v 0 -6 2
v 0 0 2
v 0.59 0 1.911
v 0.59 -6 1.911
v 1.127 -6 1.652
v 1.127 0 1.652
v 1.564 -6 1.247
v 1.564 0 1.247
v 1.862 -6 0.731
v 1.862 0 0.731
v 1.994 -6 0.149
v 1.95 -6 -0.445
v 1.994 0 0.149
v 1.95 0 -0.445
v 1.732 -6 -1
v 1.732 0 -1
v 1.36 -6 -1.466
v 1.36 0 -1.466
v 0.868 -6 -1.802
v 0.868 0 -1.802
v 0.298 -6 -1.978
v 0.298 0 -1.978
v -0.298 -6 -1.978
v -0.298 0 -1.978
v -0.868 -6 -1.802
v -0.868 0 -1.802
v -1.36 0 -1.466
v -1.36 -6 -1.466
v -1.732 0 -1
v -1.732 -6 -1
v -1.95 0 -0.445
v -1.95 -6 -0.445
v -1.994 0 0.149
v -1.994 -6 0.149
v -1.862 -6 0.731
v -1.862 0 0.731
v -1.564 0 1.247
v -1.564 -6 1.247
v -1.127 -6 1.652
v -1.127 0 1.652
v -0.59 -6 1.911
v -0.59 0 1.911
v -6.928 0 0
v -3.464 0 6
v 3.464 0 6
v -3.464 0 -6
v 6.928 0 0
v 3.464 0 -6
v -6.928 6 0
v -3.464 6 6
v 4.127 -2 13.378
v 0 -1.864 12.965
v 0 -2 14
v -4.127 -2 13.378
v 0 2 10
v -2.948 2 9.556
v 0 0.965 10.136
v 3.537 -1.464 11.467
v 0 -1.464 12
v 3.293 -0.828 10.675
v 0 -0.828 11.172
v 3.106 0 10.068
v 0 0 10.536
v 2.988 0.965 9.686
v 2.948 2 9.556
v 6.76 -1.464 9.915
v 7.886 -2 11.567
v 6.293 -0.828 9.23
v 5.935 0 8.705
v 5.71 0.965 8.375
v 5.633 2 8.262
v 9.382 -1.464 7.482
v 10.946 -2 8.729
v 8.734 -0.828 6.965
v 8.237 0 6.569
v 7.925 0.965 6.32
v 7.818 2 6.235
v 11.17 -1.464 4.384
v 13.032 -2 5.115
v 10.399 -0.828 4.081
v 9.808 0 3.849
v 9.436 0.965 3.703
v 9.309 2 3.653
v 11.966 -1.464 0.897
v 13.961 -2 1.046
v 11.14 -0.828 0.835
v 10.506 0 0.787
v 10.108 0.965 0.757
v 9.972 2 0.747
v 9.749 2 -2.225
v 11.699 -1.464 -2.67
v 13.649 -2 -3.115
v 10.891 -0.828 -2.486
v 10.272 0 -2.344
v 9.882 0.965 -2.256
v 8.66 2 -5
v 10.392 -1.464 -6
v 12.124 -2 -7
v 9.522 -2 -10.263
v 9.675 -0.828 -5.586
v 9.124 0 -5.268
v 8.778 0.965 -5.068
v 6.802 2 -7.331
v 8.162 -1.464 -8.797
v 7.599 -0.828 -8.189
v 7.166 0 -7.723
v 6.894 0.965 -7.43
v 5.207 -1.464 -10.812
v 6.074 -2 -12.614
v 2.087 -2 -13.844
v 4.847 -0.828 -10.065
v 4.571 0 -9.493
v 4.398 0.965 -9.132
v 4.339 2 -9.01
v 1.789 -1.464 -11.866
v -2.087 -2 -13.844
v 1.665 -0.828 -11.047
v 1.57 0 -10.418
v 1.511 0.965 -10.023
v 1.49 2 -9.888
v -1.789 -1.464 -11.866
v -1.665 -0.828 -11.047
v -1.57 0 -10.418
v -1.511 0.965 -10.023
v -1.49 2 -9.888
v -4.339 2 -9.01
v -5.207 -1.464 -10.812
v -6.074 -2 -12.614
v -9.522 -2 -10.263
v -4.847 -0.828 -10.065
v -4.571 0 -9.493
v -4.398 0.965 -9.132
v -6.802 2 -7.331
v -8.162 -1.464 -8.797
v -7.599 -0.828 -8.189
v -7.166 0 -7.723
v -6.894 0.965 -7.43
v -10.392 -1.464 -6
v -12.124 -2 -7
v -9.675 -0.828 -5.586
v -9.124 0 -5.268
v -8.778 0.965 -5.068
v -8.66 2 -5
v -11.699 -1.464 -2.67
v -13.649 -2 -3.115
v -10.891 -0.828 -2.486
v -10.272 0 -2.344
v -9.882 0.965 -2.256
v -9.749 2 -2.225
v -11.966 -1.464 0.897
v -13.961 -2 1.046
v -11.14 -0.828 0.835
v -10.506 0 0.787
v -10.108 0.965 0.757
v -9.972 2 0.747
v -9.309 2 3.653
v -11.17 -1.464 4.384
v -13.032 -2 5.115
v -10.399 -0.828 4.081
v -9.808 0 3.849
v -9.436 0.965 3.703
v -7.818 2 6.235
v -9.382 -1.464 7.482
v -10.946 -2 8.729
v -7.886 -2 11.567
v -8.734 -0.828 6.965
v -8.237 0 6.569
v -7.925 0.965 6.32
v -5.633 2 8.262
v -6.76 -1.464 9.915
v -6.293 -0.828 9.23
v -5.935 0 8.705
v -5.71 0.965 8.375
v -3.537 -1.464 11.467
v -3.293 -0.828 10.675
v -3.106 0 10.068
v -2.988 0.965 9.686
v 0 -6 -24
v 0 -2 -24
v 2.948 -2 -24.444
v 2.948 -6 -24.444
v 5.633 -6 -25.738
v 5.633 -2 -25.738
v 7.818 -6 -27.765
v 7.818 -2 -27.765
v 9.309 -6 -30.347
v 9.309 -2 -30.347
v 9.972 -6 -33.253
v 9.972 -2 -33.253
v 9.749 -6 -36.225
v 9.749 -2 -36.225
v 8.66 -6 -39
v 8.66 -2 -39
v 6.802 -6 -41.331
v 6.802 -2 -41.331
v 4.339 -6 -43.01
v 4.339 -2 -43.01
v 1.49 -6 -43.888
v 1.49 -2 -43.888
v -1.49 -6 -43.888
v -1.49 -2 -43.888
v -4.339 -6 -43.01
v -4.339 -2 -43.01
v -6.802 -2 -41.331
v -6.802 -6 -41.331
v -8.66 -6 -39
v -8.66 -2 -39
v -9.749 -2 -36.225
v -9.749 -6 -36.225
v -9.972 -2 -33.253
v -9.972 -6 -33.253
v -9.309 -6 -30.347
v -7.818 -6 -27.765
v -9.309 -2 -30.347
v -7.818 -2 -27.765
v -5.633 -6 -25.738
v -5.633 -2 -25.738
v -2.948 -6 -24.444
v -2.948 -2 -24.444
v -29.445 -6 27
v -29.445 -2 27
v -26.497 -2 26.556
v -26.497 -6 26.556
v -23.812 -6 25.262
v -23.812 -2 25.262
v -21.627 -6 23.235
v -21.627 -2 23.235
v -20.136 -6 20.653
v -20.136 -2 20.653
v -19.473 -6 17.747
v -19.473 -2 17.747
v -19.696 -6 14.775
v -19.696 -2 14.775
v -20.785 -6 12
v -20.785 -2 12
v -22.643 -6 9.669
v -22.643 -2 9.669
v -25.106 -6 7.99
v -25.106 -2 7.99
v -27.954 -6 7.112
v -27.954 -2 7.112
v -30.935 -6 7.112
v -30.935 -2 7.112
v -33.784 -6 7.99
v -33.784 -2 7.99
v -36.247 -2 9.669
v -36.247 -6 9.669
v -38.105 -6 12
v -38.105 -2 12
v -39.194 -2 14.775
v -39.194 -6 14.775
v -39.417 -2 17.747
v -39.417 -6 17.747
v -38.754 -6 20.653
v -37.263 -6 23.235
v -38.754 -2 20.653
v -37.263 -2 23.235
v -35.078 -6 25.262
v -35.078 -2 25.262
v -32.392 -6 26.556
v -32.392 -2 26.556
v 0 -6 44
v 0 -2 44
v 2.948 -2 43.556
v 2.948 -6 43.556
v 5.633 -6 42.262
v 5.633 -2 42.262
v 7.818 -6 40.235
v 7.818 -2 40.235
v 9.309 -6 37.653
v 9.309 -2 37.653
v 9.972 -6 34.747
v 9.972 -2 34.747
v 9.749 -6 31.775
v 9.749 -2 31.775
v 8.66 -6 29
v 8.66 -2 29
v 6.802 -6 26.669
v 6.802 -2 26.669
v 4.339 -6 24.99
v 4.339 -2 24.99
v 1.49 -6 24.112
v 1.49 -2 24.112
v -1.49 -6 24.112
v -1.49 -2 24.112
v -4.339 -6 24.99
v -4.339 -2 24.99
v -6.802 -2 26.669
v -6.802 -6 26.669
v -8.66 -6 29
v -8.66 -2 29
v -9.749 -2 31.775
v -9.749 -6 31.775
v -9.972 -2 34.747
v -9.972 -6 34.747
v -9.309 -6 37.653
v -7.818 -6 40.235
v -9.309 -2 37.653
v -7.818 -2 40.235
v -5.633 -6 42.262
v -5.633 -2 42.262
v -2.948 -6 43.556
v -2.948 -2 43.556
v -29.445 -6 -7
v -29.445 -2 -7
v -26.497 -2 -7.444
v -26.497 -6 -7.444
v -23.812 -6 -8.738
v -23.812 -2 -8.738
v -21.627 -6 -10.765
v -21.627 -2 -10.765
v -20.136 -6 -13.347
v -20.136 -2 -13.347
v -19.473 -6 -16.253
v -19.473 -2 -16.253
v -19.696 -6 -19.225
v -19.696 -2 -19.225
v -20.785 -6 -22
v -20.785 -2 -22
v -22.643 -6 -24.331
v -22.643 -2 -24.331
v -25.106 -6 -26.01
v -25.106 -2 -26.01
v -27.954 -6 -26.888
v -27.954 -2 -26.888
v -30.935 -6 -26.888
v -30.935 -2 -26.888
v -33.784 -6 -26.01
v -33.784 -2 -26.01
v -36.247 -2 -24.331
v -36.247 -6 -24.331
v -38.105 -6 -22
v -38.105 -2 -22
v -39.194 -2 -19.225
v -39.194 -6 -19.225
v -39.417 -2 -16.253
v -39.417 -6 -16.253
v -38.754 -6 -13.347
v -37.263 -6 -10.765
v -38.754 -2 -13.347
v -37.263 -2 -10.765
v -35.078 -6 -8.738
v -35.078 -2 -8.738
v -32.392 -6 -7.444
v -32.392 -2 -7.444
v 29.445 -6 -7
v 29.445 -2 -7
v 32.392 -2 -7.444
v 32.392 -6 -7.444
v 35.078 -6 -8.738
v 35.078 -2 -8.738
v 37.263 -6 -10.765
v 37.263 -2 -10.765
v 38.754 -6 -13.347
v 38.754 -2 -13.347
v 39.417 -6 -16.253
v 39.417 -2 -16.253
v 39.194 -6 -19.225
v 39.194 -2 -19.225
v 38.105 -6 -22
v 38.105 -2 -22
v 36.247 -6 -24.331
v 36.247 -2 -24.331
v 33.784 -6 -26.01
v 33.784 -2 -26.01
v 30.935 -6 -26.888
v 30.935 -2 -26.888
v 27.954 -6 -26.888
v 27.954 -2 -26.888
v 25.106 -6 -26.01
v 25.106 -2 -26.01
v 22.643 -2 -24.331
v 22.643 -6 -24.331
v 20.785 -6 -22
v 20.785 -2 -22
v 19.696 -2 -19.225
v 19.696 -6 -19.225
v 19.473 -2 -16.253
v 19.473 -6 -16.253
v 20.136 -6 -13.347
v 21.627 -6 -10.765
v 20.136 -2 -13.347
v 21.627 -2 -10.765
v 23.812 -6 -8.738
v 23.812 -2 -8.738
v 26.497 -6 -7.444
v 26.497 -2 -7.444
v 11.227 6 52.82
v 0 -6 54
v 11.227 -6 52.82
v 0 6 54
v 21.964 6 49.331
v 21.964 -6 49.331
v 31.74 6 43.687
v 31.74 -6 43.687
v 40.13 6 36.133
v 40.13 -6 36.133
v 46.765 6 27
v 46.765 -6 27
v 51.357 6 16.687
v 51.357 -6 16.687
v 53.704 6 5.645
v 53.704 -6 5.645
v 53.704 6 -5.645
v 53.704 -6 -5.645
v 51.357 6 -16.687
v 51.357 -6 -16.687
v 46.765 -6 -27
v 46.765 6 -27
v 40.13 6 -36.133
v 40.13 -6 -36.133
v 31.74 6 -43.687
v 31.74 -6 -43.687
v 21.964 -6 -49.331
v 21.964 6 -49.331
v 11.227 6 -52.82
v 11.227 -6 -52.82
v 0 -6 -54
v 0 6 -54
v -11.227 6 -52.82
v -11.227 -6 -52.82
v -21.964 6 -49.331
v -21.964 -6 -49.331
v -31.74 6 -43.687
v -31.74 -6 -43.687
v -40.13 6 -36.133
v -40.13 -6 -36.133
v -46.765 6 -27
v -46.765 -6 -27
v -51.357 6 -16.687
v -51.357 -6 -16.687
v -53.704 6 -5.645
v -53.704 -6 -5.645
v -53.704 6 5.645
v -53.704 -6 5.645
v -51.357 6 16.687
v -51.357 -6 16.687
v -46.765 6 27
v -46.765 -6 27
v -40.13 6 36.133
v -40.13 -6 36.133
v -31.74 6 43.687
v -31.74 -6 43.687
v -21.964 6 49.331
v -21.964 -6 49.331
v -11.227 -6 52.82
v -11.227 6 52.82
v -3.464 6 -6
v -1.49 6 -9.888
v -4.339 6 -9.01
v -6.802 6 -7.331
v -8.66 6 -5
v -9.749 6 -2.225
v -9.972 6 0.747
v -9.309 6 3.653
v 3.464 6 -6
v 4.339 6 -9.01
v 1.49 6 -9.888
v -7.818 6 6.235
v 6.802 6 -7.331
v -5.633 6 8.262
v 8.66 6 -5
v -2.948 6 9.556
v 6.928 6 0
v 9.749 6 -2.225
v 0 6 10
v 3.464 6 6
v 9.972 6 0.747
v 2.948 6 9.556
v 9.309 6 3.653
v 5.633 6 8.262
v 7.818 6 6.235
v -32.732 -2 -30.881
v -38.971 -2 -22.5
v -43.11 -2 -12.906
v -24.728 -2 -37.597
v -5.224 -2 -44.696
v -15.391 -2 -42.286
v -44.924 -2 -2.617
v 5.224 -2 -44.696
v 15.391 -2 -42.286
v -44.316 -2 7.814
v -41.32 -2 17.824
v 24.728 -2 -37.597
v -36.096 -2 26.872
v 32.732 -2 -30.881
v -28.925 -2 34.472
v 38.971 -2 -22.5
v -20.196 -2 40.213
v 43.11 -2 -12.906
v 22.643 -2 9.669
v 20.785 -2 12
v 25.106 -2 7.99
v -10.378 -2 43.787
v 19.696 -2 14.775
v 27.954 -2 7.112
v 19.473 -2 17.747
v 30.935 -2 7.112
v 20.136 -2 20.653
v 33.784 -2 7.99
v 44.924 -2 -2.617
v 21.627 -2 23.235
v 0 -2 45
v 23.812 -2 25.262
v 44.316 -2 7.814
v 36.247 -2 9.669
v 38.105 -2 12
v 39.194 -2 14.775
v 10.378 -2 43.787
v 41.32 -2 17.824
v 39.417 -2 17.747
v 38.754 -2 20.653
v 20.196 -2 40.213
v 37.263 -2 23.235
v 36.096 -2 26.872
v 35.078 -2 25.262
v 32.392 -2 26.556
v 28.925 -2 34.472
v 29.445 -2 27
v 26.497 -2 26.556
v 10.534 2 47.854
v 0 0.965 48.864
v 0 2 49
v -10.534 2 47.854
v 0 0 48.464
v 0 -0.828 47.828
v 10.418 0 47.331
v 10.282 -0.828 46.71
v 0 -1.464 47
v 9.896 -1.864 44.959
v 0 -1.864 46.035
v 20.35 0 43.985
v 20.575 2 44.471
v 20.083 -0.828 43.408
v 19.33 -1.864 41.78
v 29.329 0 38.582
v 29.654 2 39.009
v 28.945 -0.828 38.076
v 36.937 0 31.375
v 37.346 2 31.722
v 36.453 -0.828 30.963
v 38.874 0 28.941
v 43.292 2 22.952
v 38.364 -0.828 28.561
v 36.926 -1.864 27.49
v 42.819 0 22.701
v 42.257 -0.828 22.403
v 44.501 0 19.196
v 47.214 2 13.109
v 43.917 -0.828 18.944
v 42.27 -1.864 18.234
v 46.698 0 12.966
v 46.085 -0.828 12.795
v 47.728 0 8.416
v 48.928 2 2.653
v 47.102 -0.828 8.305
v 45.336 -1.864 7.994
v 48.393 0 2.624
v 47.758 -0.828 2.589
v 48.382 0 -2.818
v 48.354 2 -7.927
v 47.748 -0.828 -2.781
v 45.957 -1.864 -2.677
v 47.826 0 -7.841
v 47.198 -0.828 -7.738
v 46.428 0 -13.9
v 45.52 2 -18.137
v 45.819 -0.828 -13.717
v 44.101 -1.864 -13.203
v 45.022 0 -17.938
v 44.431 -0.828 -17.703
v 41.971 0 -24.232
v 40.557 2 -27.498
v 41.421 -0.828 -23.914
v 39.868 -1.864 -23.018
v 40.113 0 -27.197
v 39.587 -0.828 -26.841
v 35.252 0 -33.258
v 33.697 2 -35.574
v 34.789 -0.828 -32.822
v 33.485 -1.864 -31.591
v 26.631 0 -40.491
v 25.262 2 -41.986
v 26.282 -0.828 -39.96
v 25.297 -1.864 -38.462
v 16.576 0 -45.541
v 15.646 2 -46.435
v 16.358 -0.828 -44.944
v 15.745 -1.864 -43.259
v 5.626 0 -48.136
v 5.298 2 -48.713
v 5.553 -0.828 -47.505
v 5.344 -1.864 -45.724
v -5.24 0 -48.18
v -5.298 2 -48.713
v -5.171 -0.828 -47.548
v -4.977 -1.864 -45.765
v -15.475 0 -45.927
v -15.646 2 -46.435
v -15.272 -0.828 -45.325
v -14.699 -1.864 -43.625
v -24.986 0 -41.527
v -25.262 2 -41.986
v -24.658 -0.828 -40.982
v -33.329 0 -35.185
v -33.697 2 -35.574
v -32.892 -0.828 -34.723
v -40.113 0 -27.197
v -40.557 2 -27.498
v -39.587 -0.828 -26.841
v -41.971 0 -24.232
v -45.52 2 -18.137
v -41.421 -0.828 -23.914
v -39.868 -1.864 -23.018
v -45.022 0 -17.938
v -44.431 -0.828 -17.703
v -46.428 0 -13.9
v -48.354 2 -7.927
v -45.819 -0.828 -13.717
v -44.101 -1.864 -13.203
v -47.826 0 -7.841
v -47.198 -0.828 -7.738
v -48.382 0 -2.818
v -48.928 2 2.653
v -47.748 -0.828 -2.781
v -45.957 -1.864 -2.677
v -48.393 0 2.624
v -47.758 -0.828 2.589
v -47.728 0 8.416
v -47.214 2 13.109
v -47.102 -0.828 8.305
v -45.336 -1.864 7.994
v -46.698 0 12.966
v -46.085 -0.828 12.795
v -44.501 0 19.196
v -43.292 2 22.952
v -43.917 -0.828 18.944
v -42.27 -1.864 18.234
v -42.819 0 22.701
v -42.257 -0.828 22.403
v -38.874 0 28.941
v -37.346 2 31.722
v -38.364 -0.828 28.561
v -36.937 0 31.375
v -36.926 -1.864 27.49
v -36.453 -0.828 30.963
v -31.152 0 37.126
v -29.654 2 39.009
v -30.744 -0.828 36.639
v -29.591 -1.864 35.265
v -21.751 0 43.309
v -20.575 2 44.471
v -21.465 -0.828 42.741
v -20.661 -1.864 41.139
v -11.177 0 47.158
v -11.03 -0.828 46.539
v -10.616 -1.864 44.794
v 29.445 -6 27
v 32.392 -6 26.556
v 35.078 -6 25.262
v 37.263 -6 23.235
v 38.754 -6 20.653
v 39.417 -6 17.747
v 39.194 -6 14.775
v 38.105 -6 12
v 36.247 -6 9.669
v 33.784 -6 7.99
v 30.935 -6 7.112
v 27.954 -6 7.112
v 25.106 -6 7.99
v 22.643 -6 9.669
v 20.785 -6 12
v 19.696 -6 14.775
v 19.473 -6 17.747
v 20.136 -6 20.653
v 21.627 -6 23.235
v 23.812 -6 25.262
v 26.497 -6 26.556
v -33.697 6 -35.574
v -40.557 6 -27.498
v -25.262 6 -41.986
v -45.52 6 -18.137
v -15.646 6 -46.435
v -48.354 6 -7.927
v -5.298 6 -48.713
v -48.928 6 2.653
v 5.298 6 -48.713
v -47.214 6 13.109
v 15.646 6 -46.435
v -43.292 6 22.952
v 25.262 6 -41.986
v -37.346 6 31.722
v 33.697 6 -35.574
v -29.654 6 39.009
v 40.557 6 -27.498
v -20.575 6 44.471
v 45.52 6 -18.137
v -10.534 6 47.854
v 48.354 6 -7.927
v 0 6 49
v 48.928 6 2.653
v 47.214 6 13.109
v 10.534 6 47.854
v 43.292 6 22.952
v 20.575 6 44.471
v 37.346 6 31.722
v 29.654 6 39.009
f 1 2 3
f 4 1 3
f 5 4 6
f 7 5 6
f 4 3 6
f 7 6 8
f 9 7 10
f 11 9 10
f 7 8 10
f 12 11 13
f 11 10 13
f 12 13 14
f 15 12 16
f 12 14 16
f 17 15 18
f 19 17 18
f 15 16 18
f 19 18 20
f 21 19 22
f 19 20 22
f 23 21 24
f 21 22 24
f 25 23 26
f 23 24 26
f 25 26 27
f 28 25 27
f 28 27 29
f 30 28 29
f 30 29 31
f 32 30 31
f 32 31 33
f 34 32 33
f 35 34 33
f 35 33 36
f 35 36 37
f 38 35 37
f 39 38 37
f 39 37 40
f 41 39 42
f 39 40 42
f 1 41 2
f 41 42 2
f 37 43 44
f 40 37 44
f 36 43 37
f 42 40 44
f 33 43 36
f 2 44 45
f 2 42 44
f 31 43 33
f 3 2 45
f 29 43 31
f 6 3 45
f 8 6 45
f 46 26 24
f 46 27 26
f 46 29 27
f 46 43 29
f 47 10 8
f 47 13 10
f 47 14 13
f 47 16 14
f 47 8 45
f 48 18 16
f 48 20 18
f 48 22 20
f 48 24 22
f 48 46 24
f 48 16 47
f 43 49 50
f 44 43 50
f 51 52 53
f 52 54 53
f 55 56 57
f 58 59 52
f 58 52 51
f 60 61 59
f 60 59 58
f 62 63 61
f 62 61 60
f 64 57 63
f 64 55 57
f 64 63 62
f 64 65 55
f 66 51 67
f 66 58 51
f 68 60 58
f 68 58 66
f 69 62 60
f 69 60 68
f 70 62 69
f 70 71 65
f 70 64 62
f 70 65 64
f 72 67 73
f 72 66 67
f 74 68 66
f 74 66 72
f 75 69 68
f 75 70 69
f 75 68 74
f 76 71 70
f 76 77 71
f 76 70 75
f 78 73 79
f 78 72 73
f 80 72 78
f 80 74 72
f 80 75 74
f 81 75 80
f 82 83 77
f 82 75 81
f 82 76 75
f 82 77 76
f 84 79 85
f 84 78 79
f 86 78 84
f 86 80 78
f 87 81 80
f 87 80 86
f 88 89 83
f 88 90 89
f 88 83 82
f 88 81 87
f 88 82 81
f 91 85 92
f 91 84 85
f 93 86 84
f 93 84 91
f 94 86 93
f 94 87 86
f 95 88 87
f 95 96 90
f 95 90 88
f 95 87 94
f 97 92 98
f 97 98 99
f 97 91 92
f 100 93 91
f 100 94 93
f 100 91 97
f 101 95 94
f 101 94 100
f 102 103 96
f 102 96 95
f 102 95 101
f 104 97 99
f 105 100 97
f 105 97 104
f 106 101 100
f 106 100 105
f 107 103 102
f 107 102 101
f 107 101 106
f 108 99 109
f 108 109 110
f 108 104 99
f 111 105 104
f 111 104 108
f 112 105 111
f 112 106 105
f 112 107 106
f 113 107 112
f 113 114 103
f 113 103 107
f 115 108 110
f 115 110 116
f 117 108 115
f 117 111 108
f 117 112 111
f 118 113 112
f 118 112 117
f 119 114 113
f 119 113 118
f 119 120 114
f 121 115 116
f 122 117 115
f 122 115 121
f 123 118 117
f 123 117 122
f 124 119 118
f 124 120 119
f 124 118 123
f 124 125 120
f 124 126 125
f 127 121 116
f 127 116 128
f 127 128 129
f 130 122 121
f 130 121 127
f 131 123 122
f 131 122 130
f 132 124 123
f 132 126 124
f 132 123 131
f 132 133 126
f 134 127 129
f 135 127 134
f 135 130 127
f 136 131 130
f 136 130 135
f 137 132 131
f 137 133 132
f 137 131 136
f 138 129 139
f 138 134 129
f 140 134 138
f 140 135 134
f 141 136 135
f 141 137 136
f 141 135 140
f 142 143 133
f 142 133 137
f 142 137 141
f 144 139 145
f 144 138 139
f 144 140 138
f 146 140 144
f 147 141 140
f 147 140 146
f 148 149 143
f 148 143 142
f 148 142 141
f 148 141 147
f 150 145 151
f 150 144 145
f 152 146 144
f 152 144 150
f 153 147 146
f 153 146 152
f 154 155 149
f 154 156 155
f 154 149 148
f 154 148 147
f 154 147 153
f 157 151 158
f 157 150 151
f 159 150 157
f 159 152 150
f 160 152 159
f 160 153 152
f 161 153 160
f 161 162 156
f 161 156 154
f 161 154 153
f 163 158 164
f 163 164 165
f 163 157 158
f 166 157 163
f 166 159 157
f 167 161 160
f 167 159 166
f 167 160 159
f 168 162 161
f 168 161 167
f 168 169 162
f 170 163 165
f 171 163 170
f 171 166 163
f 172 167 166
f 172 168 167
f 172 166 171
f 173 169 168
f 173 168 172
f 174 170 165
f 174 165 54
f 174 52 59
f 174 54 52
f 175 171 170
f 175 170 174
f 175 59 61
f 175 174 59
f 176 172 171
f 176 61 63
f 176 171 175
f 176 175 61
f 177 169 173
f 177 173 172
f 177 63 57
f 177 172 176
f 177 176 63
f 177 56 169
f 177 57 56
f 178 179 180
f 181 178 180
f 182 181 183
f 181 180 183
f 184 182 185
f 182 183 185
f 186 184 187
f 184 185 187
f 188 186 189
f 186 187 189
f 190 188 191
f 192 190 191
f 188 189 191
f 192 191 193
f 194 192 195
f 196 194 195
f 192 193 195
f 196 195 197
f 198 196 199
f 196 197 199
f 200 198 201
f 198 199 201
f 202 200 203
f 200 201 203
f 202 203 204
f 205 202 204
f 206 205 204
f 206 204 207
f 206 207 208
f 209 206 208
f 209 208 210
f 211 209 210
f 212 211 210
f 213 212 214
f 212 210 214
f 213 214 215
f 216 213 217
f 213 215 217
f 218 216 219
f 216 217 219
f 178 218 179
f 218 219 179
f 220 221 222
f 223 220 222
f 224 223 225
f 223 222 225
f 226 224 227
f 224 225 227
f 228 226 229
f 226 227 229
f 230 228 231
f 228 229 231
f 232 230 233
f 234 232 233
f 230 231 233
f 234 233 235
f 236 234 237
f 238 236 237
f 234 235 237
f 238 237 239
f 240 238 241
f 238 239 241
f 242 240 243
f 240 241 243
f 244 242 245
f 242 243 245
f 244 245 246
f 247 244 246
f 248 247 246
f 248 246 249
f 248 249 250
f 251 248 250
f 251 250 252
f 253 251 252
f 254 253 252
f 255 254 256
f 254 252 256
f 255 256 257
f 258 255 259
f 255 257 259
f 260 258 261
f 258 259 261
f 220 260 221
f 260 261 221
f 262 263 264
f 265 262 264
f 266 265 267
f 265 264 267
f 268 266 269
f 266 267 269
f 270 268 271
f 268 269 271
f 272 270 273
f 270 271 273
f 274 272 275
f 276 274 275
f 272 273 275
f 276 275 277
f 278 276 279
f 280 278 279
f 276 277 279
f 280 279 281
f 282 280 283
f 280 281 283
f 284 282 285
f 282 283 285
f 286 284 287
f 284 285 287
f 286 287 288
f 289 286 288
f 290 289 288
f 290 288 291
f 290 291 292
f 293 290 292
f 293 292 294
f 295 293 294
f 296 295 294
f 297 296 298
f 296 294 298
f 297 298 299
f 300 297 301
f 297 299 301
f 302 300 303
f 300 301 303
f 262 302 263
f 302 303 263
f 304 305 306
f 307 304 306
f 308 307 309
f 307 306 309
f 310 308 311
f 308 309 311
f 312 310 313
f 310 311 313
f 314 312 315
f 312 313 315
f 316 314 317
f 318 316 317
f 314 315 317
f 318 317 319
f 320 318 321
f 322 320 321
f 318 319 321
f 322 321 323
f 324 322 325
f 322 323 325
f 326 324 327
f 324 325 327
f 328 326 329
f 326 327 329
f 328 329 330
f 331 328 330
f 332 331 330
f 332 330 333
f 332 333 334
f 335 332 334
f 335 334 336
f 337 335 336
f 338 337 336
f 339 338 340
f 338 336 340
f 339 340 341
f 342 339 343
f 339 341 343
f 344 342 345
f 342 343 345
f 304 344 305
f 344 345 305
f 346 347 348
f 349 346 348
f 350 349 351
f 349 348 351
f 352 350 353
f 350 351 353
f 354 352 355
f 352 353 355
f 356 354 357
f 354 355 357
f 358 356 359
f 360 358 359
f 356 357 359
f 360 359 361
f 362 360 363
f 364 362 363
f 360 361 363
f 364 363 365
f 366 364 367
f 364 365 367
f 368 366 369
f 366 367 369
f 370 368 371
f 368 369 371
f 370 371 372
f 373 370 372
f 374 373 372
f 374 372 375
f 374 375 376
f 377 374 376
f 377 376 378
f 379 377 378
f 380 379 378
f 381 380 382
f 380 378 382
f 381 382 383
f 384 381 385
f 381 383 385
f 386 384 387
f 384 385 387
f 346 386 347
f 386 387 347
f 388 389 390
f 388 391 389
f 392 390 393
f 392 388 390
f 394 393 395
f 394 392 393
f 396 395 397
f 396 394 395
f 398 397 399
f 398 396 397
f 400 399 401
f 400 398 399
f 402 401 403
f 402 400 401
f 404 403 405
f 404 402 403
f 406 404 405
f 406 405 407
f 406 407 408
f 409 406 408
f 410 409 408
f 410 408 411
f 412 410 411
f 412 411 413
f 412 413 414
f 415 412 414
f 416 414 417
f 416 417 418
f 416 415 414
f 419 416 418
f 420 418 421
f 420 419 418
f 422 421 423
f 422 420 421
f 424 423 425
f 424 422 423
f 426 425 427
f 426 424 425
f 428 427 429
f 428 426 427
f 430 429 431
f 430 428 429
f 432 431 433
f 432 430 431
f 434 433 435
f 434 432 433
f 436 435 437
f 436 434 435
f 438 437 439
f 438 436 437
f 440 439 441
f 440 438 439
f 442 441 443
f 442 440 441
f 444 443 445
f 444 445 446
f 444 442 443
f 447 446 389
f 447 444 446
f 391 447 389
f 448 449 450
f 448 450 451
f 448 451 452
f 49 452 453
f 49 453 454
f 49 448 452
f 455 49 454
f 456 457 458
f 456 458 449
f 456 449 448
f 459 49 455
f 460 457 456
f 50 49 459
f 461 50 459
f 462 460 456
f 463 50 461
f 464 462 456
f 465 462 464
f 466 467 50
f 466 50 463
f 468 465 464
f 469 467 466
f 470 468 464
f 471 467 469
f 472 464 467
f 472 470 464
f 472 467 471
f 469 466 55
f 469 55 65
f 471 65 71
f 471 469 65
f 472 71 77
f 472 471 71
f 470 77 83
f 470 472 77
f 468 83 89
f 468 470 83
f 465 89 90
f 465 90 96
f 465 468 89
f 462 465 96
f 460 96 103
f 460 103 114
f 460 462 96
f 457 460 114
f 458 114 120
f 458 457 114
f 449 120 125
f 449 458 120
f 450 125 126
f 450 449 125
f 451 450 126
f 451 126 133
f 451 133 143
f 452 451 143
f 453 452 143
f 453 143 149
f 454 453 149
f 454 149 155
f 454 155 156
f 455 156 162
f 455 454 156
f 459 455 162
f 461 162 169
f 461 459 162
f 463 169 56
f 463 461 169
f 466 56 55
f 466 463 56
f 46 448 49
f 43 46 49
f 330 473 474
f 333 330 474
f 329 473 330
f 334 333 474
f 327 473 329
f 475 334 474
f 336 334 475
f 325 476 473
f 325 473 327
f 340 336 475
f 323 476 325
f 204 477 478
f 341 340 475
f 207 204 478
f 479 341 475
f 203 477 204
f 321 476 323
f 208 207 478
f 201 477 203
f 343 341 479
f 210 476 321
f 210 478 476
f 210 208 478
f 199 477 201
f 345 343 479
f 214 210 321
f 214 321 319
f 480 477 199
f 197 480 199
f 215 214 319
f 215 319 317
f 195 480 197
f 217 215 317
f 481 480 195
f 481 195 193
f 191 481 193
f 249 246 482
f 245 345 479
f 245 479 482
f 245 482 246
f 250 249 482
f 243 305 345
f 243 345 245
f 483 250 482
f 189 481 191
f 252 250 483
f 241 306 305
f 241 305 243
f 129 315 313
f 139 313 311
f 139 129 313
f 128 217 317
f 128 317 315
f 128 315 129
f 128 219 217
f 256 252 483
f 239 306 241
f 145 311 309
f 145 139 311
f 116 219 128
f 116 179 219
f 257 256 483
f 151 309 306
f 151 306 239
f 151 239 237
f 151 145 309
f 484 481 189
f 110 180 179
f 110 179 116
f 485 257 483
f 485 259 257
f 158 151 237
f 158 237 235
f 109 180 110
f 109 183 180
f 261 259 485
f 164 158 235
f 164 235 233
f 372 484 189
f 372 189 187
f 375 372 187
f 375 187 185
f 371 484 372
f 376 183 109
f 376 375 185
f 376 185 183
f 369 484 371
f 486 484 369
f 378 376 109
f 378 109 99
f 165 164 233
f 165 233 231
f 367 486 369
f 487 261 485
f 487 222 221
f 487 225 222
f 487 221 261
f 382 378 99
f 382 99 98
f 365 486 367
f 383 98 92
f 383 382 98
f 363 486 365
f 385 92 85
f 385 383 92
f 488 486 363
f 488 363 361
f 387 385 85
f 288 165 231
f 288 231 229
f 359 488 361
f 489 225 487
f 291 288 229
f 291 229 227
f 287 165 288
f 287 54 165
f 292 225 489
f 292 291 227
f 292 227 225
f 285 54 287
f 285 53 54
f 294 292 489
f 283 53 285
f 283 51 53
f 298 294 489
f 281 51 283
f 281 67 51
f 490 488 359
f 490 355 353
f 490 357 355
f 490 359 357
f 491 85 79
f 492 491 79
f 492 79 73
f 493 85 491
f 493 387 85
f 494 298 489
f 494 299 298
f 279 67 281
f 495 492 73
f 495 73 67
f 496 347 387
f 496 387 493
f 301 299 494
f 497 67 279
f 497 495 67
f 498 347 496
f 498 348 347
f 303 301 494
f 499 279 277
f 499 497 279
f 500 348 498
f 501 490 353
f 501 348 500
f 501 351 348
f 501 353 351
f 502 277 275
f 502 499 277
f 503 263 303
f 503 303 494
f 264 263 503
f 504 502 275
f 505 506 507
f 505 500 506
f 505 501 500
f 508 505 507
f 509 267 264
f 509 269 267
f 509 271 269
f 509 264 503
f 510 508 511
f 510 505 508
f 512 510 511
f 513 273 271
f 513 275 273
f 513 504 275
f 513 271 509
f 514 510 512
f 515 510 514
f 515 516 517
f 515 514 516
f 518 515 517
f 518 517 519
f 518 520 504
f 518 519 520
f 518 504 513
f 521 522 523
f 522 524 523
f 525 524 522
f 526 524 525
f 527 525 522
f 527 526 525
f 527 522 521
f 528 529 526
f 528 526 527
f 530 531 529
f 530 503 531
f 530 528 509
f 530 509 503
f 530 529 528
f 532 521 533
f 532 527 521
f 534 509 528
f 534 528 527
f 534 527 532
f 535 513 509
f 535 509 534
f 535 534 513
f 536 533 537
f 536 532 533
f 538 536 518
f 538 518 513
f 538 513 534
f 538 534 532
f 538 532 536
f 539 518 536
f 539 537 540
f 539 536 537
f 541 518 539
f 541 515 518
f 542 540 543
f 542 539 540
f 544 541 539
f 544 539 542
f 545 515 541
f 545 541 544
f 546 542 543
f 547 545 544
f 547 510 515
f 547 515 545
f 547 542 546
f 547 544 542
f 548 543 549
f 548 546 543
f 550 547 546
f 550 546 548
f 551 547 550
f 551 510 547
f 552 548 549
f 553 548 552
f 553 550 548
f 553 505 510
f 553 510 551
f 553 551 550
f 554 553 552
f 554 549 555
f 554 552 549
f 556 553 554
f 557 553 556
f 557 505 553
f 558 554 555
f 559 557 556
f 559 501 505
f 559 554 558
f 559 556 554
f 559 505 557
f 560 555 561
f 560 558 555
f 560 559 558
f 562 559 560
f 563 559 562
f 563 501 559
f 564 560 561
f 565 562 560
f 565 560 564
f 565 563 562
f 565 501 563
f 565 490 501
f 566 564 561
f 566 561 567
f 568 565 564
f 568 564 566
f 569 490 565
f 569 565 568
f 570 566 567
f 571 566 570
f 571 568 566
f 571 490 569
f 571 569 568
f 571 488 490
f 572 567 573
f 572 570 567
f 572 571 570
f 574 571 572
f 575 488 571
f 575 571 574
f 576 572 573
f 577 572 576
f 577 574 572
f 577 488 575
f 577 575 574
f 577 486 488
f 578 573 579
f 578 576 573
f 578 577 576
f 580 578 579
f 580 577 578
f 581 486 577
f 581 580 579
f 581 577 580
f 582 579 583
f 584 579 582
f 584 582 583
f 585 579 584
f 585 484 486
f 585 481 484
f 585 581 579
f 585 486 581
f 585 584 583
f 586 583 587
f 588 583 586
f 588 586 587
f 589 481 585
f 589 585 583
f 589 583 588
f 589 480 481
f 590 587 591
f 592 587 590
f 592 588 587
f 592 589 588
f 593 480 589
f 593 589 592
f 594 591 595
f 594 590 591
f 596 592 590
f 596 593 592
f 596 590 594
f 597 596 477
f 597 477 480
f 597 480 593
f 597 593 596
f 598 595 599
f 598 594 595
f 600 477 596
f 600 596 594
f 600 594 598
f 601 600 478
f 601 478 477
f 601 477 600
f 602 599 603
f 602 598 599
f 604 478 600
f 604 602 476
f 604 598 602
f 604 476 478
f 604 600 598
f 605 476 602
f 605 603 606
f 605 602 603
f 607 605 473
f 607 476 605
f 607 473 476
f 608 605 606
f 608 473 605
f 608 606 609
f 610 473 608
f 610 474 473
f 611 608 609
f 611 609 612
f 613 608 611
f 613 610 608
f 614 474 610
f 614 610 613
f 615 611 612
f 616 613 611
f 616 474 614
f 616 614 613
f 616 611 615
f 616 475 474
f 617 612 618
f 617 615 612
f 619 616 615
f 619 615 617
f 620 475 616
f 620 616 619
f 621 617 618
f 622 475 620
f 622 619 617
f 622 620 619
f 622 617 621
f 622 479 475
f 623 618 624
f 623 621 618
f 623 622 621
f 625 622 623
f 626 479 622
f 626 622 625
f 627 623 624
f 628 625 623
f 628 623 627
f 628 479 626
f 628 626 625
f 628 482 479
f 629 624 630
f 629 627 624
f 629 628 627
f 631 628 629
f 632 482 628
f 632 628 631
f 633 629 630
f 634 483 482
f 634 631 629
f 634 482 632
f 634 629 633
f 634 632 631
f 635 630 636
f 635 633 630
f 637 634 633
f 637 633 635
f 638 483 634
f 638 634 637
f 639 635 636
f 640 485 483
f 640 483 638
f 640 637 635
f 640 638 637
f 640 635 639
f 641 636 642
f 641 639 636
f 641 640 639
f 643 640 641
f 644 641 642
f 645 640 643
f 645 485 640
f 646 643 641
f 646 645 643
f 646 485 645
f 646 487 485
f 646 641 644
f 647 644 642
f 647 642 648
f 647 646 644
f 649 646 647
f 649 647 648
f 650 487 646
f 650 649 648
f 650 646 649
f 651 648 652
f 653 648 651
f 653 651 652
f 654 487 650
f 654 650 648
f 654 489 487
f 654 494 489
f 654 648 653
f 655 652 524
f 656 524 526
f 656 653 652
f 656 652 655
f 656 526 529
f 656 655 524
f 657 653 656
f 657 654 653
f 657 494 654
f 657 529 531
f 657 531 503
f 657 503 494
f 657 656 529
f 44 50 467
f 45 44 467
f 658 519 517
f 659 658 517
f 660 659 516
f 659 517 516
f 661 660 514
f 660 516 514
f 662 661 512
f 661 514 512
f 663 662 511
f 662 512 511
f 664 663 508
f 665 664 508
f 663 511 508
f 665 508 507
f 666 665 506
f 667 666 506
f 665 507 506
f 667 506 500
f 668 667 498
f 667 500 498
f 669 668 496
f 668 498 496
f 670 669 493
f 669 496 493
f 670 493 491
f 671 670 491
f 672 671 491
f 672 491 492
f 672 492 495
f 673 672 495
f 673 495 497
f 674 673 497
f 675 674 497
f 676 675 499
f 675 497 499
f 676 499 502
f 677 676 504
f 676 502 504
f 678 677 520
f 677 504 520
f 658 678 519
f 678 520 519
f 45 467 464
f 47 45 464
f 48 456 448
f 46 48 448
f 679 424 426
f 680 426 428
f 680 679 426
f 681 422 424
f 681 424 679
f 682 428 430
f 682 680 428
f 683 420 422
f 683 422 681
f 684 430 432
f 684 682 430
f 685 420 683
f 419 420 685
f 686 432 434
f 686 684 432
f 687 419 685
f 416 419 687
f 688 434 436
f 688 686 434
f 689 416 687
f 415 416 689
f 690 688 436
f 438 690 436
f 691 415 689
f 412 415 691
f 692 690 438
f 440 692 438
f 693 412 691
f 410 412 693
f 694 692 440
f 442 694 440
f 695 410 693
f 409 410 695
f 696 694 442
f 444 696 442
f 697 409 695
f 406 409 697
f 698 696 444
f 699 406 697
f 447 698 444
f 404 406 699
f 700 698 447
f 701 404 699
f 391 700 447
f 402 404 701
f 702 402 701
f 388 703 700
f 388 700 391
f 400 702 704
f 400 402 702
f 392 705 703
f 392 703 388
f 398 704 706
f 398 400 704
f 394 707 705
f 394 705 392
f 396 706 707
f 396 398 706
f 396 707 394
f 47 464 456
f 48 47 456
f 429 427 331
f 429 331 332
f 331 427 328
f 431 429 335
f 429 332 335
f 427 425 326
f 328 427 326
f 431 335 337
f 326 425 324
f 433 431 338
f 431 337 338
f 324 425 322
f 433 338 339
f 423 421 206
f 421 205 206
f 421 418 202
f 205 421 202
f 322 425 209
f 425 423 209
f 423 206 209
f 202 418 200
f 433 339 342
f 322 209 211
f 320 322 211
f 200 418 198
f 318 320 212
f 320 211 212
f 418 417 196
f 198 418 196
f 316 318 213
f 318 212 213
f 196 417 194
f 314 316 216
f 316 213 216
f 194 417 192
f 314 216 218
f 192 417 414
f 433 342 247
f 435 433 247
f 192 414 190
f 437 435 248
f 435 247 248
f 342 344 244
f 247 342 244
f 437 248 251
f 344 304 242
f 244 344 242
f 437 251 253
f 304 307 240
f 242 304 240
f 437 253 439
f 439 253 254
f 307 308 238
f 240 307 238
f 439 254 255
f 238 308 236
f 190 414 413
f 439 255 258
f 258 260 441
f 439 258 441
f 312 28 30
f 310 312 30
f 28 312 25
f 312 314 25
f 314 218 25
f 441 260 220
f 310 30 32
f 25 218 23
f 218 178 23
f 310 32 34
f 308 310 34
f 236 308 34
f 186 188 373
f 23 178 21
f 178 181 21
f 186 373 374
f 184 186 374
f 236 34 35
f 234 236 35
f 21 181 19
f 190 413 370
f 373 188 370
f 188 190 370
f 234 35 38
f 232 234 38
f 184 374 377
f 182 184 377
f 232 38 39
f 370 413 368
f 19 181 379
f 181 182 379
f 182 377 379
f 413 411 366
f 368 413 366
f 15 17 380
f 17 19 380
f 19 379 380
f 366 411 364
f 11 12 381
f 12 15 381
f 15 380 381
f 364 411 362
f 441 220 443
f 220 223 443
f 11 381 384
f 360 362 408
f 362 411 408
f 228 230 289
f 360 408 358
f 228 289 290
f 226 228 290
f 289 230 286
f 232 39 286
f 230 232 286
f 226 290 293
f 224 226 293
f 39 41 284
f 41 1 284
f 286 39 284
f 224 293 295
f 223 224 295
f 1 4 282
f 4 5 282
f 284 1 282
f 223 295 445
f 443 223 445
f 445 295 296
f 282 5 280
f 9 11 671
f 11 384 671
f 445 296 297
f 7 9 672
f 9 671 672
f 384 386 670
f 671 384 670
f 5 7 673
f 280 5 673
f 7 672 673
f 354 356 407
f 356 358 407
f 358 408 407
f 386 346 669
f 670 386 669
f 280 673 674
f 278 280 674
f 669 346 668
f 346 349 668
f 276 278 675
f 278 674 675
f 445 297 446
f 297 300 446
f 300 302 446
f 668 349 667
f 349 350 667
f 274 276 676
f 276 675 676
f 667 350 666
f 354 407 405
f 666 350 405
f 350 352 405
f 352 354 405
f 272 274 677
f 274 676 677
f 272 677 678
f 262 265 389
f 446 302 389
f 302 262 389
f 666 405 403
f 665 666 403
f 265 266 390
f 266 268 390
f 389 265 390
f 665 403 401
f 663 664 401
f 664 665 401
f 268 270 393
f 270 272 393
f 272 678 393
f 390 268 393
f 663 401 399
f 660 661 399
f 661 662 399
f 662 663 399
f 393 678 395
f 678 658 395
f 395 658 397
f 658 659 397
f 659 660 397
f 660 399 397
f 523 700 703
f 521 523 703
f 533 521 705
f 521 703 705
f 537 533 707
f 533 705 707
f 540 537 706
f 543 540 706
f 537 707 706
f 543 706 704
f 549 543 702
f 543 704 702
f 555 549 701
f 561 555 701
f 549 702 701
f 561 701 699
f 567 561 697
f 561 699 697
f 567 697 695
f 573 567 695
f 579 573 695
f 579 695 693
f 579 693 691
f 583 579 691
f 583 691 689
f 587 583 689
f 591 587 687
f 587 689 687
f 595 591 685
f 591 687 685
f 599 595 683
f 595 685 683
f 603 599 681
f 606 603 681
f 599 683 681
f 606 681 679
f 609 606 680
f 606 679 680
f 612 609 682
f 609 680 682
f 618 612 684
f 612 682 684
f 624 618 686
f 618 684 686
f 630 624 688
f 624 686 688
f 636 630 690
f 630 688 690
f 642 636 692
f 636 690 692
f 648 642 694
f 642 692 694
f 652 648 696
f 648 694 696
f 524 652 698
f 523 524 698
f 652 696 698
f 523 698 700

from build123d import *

# Parameters (mm, degrees)
SKETCH1_R           = 54
BOSS_EXTRUDE1_DEPTH = 6
SKETCH2_R           = 49
SKETCH2_R_2         = 10
CUT_EXTRUDE1_DEPTH  = 8
CUT_EXTRUDE2_DEPTH  = 6
SKETCH4_R           = 2
CUT_EXTRUDE3_DEPTH  = 6
SKETCH6_R           = 10
CUT_EXTRUDE5_DEPTH  = 4
FILLET1_R           = 4


with BuildPart() as part:
    # Sketch1 → Boss-Extrude1 (new, symmetric)
    with BuildSketch(Plane(origin=(0, 0, 0), x_dir=(1, 0, 0), z_dir=(0, 1, 0))):
        with Locations(Location((0, 0, 0), (0, 0, 270))):
            Circle(SKETCH1_R)
    extrude(amount=BOSS_EXTRUDE1_DEPTH, both=True)

    # Sketch2 → Cut-Extrude1 (cut)
    with BuildSketch(Plane(origin=(0, 6, 0), x_dir=(1, 0, 0), z_dir=(0, 1, 0))):
        with Locations(Location((0, 0, 0), (0, 0, 270))):
            Circle(SKETCH2_R)
        with Locations(Location((0, 0, 0), (0, 0, 270))):
            Circle(SKETCH2_R_2, mode=Mode.SUBTRACT)
    extrude(amount=-CUT_EXTRUDE1_DEPTH, mode=Mode.SUBTRACT)

    # Sketch3 → Cut-Extrude2 (cut)
    with BuildSketch(Plane(origin=(0, 6, 0), x_dir=(1, 0, 0), z_dir=(0, 1, 0))):
        Polygon((6.92820323, 0), (3.464101615, 6), (-3.464101615, 6), (-6.92820323, 0), (-3.464101615, -6), (3.464101615, -6), align=None)
    extrude(amount=-CUT_EXTRUDE2_DEPTH, mode=Mode.SUBTRACT)

    # Sketch4 → Cut-Extrude3 (cut)
    with BuildSketch(Plane(origin=(0, 0, 0), x_dir=(1, 0, 0), z_dir=(0, 1, 0))):
        with Locations(Location((0, 0, 0), (0, 0, 270))):
            Circle(SKETCH4_R)
    extrude(amount=-CUT_EXTRUDE3_DEPTH, mode=Mode.SUBTRACT)

    # Sketch6 → Cut-Extrude5 (cut)
    with BuildSketch(Plane(origin=(0, -2, 0), x_dir=(1, 0, 0), z_dir=(0, 1, 0))):
        with Locations(Location((0, 34, 0), (0, 0, 270))):
            Circle(SKETCH6_R)
        with Locations(Location((29.444863729, 17, 0), (0, 0, 270))):
            Circle(SKETCH6_R)
        with Locations(Location((29.444863729, -17, 0), (0, 0, 270))):
            Circle(SKETCH6_R)
        with Locations(Location((0, -34, 0), (0, 0, 270))):
            Circle(SKETCH6_R)
        with Locations(Location((-29.444863729, -17, 0), (0, 0, 270))):
            Circle(SKETCH6_R)
        with Locations(Location((-29.444863729, 17, 0), (0, 0, 270))):
            Circle(SKETCH6_R)
    extrude(amount=-CUT_EXTRUDE5_DEPTH, mode=Mode.SUBTRACT)

    # Fillet1
    fillet1_edges = [part.edges().sort_by_distance(p)[0] for p in [
        (0, -2, -49),
        (0, -2, -10),
    ]]
    fillet(fillet1_edges, radius=FILLET1_R)


solid = part.part
